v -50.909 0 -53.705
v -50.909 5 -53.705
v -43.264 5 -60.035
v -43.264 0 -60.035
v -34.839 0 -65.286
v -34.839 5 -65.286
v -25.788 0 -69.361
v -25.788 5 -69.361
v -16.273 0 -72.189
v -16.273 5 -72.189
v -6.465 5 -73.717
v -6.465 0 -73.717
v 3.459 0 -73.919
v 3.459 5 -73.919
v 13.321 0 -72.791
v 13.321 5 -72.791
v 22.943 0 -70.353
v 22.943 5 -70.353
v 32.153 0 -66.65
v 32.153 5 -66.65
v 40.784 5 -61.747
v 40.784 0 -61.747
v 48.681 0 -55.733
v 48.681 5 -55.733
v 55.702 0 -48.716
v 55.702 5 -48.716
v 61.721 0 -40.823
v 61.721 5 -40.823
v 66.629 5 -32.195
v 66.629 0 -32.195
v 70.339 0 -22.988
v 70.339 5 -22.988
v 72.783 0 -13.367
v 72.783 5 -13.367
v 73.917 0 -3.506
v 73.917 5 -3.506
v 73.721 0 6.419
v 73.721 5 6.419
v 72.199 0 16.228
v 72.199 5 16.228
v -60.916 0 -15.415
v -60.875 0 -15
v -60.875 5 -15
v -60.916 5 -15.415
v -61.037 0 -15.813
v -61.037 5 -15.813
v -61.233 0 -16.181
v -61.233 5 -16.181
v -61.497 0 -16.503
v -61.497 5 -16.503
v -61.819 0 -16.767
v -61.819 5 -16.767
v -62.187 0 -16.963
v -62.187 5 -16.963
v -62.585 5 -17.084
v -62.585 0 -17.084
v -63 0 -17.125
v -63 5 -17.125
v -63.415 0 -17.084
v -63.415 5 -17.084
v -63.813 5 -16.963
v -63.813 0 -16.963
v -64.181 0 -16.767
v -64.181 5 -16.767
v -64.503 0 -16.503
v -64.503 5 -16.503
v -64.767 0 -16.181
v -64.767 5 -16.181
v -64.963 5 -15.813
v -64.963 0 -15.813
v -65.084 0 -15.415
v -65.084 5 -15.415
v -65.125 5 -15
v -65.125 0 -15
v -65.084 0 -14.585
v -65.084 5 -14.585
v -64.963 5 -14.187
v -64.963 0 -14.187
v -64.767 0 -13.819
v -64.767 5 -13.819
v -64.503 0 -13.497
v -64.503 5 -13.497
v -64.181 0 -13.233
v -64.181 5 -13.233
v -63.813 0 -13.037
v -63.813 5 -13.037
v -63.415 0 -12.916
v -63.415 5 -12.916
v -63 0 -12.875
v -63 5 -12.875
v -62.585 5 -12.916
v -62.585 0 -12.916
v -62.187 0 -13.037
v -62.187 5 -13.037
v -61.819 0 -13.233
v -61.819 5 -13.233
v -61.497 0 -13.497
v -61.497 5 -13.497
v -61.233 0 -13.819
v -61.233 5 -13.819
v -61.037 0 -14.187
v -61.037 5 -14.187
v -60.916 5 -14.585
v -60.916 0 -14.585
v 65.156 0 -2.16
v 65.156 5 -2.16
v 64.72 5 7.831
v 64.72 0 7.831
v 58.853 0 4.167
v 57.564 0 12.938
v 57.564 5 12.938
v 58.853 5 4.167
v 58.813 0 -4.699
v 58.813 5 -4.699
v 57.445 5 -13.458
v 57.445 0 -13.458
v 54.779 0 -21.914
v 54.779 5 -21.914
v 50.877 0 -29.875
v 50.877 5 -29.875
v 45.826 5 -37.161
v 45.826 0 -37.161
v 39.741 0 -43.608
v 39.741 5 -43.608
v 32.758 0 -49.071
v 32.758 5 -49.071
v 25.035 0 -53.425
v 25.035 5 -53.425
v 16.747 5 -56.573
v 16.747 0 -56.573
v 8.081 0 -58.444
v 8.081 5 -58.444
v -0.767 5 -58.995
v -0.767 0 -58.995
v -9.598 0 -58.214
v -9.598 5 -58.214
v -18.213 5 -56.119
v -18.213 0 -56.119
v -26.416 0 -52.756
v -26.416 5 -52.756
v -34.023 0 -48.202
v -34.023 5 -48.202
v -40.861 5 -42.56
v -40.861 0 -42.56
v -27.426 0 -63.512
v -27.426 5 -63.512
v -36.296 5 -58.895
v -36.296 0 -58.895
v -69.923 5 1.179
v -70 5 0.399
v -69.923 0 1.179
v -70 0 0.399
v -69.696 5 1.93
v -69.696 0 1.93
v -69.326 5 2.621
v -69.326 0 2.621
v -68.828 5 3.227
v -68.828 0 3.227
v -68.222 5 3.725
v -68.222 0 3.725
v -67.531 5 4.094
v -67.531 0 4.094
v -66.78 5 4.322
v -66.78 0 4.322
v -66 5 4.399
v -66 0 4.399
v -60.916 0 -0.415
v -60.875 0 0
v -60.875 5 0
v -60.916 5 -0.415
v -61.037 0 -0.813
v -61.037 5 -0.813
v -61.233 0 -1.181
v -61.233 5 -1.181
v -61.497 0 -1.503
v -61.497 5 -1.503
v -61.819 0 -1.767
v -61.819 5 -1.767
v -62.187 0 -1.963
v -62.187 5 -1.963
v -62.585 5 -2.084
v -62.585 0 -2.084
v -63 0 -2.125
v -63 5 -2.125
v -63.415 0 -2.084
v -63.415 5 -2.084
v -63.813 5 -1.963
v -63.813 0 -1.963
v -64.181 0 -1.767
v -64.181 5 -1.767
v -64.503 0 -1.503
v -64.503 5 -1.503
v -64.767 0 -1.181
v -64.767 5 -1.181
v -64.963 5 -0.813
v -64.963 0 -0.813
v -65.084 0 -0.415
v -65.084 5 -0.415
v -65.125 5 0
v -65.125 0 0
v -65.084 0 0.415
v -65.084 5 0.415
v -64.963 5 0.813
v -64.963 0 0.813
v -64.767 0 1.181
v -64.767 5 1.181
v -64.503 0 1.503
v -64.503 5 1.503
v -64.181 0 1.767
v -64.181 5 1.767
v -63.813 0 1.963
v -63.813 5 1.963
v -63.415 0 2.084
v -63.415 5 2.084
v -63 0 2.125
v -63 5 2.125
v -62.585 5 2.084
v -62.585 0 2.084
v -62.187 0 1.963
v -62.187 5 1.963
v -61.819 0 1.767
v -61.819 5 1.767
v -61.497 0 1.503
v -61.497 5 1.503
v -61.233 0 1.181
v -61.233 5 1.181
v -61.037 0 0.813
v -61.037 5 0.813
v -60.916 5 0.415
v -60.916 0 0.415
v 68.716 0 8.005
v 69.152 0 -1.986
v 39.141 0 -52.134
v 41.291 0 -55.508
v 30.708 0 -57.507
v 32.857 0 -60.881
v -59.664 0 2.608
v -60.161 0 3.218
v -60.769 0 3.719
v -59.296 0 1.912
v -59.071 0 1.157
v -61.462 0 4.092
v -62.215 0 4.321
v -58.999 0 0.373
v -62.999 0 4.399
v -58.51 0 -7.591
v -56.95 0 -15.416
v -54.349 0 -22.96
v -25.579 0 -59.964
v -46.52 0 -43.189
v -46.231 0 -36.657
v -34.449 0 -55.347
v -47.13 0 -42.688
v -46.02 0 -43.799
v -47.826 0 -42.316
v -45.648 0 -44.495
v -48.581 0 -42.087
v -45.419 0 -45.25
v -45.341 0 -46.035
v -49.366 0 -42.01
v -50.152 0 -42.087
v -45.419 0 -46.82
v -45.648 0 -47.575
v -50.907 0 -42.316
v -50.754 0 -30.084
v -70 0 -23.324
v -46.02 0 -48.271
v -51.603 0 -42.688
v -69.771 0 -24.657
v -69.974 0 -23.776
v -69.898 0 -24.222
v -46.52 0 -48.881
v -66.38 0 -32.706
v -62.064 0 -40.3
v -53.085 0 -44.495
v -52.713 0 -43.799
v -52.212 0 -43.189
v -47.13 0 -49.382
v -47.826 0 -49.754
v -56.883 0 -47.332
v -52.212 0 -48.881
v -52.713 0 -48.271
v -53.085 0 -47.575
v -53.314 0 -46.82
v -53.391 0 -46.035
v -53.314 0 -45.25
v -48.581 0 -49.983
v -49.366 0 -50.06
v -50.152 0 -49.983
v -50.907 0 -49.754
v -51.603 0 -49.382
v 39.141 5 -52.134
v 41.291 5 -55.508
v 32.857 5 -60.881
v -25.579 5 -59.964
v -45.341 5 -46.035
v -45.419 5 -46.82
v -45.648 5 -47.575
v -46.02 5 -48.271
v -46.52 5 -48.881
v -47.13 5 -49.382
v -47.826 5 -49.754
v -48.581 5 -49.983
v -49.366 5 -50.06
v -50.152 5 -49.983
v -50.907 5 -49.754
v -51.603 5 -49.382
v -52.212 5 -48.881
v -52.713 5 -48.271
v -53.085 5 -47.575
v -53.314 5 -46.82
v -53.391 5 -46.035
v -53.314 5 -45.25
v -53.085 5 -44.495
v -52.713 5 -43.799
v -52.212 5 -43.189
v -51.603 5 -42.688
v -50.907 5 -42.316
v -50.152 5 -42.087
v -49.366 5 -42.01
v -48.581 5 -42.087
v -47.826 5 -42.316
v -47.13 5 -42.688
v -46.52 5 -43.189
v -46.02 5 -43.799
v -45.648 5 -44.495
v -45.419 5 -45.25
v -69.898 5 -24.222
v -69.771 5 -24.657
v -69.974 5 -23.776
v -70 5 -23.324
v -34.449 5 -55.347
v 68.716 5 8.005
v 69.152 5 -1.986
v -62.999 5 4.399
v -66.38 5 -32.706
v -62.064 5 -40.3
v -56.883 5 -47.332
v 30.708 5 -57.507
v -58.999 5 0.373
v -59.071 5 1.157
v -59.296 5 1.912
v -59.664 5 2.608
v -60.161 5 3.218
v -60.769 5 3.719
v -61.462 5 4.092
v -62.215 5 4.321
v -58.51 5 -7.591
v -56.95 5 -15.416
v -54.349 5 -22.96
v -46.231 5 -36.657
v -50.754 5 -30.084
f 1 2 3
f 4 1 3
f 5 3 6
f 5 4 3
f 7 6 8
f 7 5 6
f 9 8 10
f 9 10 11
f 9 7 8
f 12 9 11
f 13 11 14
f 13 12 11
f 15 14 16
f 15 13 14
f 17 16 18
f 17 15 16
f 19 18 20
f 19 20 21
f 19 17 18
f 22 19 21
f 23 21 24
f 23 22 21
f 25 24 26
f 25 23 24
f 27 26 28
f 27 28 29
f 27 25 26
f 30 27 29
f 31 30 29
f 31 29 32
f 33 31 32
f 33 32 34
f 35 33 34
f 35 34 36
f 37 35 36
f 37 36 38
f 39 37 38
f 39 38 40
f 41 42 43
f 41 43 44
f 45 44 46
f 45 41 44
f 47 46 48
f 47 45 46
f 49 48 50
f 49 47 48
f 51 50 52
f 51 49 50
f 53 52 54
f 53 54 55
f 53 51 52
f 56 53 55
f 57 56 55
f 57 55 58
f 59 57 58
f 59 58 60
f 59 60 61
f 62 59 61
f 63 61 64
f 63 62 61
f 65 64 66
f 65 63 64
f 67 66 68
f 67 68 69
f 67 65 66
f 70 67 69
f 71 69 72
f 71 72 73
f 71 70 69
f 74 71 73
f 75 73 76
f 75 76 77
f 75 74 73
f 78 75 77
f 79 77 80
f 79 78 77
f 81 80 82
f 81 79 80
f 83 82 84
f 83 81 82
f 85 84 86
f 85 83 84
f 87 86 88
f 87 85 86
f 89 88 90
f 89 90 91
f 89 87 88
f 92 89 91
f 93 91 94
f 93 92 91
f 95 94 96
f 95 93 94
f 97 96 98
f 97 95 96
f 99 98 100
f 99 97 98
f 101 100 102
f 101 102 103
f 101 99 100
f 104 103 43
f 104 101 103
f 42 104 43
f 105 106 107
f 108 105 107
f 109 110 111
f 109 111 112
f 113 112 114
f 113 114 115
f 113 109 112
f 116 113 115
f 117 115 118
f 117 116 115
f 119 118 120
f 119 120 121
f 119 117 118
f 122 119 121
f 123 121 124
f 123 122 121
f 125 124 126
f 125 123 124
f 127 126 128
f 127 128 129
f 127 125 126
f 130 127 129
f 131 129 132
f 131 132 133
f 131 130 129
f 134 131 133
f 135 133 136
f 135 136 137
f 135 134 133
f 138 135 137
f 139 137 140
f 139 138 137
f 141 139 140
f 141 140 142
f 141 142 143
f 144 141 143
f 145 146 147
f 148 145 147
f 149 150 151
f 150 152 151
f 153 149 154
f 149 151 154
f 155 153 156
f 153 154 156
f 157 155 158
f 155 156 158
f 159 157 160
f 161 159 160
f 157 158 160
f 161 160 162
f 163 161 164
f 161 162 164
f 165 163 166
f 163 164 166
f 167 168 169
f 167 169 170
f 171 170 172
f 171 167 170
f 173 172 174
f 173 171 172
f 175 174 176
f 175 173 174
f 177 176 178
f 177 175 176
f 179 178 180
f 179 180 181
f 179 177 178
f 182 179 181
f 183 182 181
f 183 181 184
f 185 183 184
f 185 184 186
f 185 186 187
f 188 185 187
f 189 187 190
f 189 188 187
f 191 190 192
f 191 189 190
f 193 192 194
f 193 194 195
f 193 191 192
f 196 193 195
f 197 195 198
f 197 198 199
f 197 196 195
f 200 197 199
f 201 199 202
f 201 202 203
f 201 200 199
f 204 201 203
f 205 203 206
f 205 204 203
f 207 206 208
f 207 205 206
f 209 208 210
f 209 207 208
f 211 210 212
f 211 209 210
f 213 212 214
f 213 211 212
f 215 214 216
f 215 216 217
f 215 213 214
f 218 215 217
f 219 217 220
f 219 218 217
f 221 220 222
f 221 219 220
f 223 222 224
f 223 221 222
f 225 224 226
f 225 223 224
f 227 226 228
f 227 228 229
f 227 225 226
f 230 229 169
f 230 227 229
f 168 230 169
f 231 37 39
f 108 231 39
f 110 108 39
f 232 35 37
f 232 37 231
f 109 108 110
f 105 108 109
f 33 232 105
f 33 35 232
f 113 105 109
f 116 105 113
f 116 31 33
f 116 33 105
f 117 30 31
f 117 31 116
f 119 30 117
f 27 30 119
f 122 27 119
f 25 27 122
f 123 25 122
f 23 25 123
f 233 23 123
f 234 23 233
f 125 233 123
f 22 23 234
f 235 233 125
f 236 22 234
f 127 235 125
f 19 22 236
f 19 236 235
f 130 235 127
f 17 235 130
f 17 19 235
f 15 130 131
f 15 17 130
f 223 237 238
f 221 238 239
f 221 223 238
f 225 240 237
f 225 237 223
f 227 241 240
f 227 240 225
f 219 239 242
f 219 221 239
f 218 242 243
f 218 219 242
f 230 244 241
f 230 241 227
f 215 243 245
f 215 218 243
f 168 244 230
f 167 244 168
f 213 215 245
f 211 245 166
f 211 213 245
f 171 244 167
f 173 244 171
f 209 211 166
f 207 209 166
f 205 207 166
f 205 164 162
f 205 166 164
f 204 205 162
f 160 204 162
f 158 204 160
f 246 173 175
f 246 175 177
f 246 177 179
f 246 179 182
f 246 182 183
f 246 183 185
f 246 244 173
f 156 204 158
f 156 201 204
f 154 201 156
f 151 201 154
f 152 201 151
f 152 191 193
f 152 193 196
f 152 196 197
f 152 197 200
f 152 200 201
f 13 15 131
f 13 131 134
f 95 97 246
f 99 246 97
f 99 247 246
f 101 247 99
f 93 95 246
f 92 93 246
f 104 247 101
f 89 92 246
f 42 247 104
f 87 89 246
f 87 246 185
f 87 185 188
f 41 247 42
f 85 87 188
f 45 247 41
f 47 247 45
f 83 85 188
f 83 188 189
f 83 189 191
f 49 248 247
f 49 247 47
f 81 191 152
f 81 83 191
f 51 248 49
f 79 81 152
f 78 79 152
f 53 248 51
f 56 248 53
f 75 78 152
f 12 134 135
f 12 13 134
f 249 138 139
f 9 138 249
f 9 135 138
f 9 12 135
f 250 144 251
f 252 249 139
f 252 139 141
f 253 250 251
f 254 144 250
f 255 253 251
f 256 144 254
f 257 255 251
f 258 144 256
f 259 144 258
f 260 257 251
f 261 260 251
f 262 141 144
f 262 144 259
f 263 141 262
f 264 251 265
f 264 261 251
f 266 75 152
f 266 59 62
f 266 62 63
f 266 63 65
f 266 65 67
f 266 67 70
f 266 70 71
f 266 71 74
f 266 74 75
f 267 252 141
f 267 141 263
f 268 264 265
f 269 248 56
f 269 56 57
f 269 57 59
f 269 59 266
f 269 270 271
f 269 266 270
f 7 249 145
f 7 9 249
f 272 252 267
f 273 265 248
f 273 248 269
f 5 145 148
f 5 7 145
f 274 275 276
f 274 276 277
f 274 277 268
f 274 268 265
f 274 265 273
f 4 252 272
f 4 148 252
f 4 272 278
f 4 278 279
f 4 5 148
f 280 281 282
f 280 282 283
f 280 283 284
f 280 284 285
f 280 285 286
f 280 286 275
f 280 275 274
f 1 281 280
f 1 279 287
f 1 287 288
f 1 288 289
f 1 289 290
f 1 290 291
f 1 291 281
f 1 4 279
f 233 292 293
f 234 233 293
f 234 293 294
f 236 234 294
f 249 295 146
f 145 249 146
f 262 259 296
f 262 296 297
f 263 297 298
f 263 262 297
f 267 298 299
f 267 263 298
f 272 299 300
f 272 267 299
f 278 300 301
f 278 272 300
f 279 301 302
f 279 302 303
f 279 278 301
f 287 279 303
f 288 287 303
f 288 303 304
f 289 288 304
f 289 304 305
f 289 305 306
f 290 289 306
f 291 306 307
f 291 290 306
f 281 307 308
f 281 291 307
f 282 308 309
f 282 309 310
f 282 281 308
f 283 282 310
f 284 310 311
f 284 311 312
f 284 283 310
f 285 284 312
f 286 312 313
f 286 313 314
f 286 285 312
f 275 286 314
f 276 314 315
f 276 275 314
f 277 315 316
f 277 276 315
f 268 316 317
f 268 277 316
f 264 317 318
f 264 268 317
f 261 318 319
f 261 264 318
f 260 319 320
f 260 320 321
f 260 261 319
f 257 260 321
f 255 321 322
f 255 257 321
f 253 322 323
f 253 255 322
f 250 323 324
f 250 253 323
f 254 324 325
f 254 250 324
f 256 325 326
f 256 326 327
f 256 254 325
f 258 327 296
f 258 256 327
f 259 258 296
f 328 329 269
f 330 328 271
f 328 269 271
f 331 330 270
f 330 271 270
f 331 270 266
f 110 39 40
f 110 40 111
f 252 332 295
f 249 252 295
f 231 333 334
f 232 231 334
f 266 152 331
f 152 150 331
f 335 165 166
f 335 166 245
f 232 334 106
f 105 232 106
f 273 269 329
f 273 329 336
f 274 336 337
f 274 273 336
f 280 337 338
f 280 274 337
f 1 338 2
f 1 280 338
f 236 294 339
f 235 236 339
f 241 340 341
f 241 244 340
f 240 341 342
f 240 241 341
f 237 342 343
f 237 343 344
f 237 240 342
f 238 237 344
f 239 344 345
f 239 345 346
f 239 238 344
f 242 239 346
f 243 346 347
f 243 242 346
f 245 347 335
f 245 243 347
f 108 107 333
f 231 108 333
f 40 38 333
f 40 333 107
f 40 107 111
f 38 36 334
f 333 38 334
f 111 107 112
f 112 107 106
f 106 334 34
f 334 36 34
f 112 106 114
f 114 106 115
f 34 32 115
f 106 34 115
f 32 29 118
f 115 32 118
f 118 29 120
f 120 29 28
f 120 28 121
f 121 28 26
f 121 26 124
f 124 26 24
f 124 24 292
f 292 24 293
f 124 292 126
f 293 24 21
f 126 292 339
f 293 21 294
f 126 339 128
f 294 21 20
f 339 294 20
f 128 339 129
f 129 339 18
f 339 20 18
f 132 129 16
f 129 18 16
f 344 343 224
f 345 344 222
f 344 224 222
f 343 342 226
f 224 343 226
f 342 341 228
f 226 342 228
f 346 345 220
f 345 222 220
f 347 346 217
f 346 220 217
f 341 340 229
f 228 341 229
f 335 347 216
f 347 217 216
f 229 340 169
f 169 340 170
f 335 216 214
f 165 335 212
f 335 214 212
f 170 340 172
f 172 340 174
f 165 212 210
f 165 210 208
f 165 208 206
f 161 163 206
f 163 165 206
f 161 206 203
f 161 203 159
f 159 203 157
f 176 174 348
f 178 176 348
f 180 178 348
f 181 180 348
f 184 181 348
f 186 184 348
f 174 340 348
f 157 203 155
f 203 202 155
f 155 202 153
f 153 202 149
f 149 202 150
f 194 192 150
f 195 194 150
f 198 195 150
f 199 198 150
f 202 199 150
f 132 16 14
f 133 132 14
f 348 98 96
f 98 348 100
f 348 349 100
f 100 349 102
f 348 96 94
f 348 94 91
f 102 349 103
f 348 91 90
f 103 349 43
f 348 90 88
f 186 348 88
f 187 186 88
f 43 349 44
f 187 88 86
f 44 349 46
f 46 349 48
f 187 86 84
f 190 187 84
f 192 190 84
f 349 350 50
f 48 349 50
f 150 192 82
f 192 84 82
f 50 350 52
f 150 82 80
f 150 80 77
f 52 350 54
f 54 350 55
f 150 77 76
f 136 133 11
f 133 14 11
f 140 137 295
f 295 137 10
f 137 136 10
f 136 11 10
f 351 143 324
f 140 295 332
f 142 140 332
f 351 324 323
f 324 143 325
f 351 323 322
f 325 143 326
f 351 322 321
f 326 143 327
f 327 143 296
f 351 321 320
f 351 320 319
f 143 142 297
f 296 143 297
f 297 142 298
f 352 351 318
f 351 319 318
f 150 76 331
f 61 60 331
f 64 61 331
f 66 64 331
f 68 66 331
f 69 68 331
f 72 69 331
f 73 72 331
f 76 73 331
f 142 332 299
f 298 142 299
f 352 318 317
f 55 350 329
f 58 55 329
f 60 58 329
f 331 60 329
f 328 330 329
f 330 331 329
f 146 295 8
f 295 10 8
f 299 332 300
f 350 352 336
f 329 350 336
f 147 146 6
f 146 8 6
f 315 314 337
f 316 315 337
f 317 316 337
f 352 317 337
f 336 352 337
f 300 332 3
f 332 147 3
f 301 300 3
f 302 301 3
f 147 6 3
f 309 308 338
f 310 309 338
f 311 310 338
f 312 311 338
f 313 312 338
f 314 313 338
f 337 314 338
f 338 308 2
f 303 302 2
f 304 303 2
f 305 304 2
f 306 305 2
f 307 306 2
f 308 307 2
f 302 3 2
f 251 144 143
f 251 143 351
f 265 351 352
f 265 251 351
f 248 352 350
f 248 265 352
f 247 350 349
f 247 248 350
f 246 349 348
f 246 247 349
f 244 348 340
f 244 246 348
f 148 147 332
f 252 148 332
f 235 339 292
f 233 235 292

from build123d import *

# Parameters (mm, degrees)
SKETCH1_R               = 4.025
SKETCH1_R_2             = 2.125
BOSS_EXTRUDE1_DEPTH     = 5
SKETCH2_W               = 28.904595792
SKETCH2_H               = 55.332112
CUT_EXTRUDE1_DEPTH      = 1
CUT_EXTRUDE1_DEPTH_BACK = 6
SKETCH3_W               = 24.207106467
SKETCH3_H               = 21.100530829
CUT_EXTRUDE2_DEPTH      = 1
CUT_EXTRUDE2_DEPTH_BACK = 6
FILLET1_R               = 4
BOSS_EXTRUDE2_DEPTH     = 5
CUT_EXTRUDE3_DEPTH      = 6
CIRPATTERN1_COUNT       = 3
CIRPATTERN1_ANGLE       = 120


with BuildPart() as part:
    # Sketch1 → Boss-Extrude1 (new body)
    with BuildSketch(Plane(origin=(0, 0, 0), x_dir=(1, 0, 0), z_dir=(0, 1, 0))):
        with BuildLine():
            Line((-47.75734818, 56.526415903), (-38.07680463, 45.068358625))
            ThreePointArc((-38.07680463, 45.068358625), (-56.716415256, 16.255714087), (-56.169167779, -18.056151058))
            Line((-56.169167779, -18.056151058), (-70.449464672, -22.646697938))
            ThreePointArc((-70.449464672, -22.646697938), (-71.135842864, 20.388522754), (-47.75734818, 56.526415903))
        make_face()
        with Locations((-49.366374859, 46.034889304)):
            Circle(SKETCH1_R, mode=Mode.SUBTRACT)
        with Locations((-63, 0)):
            Circle(SKETCH1_R_2, mode=Mode.SUBTRACT)
        with Locations((-63, -15)):
            Circle(SKETCH1_R_2, mode=Mode.SUBTRACT)
        with Locations((-63, 15)):
            Circle(SKETCH1_R_2, mode=Mode.SUBTRACT)
    extrude(amount=BOSS_EXTRUDE1_DEPTH)

    # Sketch2 → Cut-Extrude1 (cut, two sides)
    with BuildSketch(Plane(origin=(0, 5, 0), x_dir=(1, 0, 0), z_dir=(0, 1, 0))) as cut_extrude1_sk:
        with Locations((-84.452297896, 0)):
            Rectangle(SKETCH2_W, SKETCH2_H)
    extrude(amount=CUT_EXTRUDE1_DEPTH, mode=Mode.SUBTRACT)
    extrude(cut_extrude1_sk.sketch, amount=-CUT_EXTRUDE1_DEPTH_BACK, mode=Mode.SUBTRACT)

    # Sketch3 → Cut-Extrude2 (cut, two sides)
    with BuildSketch(Plane(origin=(0, 5, 0), x_dir=(1, 0, 0), z_dir=(0, 1, 0))) as cut_extrude2_sk:
        with Locations((-57.896446767, -14.949043558)):
            Rectangle(SKETCH3_W, SKETCH3_H)
    extrude(amount=CUT_EXTRUDE2_DEPTH, mode=Mode.SUBTRACT)
    extrude(cut_extrude2_sk.sketch, amount=-CUT_EXTRUDE2_DEPTH_BACK, mode=Mode.SUBTRACT)

    # Fillet1
    fillet1_edges = [part.edges().sort_by_distance(p)[0] for p in [
        (-70, 2.5, -24),
        (-58.835794809, 2.5, 4.398778143),
        (-70, 2.5, 4.398778143),
        (-47.75734818, 2.5, -56.526415903),
        (-38.07680463, 2.5, -45.068358625),
    ]]
    fillet(fillet1_edges, radius=FILLET1_R)

    # Sketch4 → Boss-Extrude2 (add)
    with BuildSketch(Plane(origin=(0, 0, 0), x_dir=(1, 0, 0), z_dir=(0, 1, 0))):
        with BuildLine():
            ThreePointArc((-54.349205626, 50.221149408), (34.402166182, 65.517104347), (72.198801996, -16.227538025))
            Line((72.198801996, -16.227538025), (57.563909699, -12.938172209))
            ThreePointArc((57.563909699, -12.938172209), (25.337317552, 53.282458082), (-46.367196347, 36.484011606))
            Line((-46.367196347, 36.484011606), (-43.532667136, 51.526011005))
            Line((-43.532667136, 51.526011005), (-54.349205626, 50.221149408))
        make_face()
    extrude(amount=BOSS_EXTRUDE2_DEPTH)

    # Sketch5 → Cut-Extrude3 (cut, through all)
    with BuildSketch(Plane(origin=(0, 5, 0), x_dir=(1, 0, 0), z_dir=(0, 1, 0))):
        Polygon((-36.295708479, 58.895004423), (-34.448714026, 55.34696109), (-25.578605694, 59.964447223), (-27.425600147, 63.512490555), align=None)
    cut_extrude3 = extrude(amount=-CUT_EXTRUDE3_DEPTH, mode=Mode.SUBTRACT)

    # CirPattern1: Cut-Extrude3 ×3 about axis
    cirpattern1_axis = Axis((0, 0, 0), (0, -1, 0))
    for i in range(1, CIRPATTERN1_COUNT):
        add(cut_extrude3.rotate(cirpattern1_axis, i * CIRPATTERN1_ANGLE / (CIRPATTERN1_COUNT - 1)), mode=Mode.SUBTRACT)


solid = part.part
